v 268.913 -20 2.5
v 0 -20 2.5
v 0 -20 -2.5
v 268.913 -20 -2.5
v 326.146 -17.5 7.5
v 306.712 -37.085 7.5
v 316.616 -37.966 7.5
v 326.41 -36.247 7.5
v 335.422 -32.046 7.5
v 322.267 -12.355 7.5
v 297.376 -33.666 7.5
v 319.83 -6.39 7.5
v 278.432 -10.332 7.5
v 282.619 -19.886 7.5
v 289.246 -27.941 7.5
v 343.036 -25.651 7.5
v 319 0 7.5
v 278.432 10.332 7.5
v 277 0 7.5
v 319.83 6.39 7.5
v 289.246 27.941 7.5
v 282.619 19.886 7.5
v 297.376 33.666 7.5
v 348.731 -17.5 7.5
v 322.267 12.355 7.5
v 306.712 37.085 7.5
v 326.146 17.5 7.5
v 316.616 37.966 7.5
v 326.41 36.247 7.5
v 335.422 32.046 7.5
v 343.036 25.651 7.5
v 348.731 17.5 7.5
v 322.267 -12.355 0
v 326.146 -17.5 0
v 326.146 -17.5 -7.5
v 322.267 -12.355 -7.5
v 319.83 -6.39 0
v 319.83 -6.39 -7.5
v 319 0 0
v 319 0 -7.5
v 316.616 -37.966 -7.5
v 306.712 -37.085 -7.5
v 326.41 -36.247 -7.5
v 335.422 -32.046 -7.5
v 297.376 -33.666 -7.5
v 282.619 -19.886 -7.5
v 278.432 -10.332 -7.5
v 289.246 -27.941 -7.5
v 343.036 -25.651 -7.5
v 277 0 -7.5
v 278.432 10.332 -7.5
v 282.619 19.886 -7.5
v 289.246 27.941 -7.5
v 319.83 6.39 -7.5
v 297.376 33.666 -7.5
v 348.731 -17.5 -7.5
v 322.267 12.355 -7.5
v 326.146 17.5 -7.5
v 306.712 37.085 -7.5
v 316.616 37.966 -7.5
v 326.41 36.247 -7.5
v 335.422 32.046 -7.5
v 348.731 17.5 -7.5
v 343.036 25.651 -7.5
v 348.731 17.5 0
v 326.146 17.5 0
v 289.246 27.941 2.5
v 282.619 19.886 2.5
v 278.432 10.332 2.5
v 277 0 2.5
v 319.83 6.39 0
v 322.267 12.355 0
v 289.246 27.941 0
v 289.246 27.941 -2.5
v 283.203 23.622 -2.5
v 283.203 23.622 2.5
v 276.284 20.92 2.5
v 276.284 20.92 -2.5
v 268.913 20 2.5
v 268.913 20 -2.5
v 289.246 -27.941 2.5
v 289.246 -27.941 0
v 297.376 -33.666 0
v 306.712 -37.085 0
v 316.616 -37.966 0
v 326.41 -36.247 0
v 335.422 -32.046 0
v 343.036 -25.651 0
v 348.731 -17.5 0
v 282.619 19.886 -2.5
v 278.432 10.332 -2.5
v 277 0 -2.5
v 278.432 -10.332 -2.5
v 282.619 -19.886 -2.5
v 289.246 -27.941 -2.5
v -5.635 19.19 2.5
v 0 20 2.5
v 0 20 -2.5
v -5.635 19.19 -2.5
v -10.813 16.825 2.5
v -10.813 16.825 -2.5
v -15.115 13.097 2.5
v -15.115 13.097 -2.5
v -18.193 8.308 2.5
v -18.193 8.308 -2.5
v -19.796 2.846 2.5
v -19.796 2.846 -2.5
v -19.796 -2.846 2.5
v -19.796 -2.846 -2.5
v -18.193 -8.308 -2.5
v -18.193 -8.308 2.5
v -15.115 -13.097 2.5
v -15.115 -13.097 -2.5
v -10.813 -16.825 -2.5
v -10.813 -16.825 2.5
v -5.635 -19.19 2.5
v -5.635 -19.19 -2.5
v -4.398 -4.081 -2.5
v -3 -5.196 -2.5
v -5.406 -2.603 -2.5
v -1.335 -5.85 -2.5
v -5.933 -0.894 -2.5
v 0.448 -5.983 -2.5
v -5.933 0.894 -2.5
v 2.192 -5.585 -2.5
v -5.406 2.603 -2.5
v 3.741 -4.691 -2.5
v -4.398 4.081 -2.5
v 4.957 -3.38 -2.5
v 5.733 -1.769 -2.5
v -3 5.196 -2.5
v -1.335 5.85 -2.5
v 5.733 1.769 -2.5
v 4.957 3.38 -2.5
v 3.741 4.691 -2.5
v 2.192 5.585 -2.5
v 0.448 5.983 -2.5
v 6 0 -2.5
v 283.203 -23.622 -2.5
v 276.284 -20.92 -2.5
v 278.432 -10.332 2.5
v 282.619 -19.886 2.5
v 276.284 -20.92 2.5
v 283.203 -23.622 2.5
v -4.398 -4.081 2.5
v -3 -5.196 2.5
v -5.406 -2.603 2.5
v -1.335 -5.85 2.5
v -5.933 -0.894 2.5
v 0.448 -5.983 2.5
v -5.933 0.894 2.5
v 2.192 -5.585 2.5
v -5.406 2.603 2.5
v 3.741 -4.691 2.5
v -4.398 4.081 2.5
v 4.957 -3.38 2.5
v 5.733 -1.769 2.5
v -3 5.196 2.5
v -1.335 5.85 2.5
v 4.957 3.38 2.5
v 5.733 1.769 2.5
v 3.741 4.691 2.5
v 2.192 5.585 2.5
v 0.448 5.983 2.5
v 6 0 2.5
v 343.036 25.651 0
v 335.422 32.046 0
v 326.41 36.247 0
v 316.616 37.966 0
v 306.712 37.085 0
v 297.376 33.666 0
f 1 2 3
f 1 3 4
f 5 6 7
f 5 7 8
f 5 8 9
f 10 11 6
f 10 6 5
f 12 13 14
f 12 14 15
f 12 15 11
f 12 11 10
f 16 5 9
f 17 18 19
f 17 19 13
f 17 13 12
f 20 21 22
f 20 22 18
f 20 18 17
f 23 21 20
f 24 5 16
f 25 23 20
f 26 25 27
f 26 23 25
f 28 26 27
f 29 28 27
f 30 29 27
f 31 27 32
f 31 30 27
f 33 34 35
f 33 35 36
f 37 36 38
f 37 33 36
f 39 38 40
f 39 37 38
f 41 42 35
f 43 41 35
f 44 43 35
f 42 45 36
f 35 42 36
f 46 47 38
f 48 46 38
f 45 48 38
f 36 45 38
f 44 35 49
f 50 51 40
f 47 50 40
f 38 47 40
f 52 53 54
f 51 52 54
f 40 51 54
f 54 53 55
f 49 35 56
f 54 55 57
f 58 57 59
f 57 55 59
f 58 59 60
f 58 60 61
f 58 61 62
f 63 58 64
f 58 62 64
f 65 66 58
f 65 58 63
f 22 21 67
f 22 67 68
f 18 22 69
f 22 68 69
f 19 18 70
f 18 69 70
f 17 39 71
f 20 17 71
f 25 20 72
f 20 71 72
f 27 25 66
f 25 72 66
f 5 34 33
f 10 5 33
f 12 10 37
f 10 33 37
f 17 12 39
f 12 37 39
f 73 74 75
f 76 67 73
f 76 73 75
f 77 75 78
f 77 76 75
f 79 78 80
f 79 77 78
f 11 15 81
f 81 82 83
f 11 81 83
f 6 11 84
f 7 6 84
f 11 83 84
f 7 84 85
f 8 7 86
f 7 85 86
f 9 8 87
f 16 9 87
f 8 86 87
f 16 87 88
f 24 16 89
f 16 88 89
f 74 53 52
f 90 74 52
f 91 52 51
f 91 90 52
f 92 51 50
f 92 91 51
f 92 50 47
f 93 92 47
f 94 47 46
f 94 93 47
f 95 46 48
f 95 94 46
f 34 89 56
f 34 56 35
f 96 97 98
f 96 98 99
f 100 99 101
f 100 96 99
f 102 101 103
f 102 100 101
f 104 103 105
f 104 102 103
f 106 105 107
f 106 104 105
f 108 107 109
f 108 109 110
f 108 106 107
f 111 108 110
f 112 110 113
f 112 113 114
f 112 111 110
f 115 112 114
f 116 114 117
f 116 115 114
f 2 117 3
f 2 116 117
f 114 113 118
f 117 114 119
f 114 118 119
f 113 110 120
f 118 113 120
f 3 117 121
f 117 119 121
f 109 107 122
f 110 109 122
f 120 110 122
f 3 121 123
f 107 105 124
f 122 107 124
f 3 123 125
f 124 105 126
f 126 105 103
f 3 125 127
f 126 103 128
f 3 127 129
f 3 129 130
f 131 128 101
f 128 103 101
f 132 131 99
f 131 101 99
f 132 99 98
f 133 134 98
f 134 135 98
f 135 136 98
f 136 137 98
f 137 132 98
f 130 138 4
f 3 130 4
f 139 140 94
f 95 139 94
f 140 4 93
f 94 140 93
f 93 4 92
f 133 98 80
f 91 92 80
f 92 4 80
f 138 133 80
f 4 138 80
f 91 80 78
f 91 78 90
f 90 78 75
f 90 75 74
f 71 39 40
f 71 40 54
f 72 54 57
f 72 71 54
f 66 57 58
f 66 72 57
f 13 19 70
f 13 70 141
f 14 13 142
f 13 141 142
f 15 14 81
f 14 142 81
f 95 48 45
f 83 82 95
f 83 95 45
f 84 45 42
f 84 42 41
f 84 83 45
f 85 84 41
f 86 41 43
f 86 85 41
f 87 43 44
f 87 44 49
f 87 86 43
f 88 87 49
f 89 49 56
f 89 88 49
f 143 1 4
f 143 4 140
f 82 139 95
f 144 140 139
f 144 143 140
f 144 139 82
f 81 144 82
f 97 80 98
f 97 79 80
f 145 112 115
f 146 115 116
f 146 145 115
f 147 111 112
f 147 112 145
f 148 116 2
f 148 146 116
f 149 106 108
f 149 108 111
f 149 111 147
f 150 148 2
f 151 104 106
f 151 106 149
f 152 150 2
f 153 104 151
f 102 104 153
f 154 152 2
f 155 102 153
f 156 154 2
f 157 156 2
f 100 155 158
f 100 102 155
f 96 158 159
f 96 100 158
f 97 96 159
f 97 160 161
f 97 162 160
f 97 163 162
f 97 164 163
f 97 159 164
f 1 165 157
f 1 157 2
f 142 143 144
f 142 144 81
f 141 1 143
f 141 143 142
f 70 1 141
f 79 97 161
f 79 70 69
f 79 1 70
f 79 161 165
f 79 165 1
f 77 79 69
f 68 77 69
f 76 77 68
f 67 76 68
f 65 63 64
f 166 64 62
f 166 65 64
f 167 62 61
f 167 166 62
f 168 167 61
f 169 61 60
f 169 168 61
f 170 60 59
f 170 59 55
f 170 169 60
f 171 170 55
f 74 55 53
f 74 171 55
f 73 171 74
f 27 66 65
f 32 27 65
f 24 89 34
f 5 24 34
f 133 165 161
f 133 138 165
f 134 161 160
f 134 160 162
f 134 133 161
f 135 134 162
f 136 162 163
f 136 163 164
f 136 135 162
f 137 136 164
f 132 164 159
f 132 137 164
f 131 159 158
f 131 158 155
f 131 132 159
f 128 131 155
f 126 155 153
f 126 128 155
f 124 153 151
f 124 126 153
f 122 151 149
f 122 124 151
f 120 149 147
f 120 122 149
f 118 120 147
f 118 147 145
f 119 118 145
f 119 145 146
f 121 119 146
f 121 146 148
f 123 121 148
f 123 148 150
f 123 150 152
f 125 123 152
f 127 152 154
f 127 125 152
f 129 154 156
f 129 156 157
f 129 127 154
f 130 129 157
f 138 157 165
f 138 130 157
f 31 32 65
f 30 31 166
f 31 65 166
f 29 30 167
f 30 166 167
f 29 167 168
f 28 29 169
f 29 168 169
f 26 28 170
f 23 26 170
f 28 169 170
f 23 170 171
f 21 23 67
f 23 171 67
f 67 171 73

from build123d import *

# Parameters (mm, degrees)
SKETCH1_R           = 6
BOSS_EXTRUDE1_DEPTH = 2.5
BOSS_EXTRUDE2_DEPTH = 7.5


with BuildPart() as part:
    # Sketch1 → Boss-Extrude1 (new, symmetric)
    with BuildSketch(Plane.XY):
        with BuildLine():
            Line((268.913125513, 20), (0, 20))
            ThreePointArc((0, 20), (-20, 0), (0, -20))
            Line((0, -20), (268.913125513, -20))
            ThreePointArc((268.913125513, -20), (279.827228639, -22.055727726), (289.245570139, -27.941176471))
            ThreePointArc((289.245570139, -27.941176471), (277, 0), (289.245570139, 27.941176471))
            ThreePointArc((289.245570139, 27.941176471), (279.827228639, 22.055727726), (268.913125513, 20))
        make_face()
        Circle(SKETCH1_R, mode=Mode.SUBTRACT)
    extrude(amount=BOSS_EXTRUDE1_DEPTH, both=True)

    # Sketch1<3> → Boss-Extrude2 (add, symmetric)
    with BuildSketch(Plane.XY):
        with BuildLine():
            Line((348.730549951, -17.5), (326.146428929, -17.5))
            ThreePointArc((326.146428929, -17.5), (319, 0), (326.146428929, 17.5))
            Line((326.146428929, 17.5), (348.730549951, 17.5))
            ThreePointArc((348.730549951, 17.5), (277, 0), (348.730549951, -17.5))
        make_face()
    extrude(amount=BOSS_EXTRUDE2_DEPTH, both=True)


solid = part.part
